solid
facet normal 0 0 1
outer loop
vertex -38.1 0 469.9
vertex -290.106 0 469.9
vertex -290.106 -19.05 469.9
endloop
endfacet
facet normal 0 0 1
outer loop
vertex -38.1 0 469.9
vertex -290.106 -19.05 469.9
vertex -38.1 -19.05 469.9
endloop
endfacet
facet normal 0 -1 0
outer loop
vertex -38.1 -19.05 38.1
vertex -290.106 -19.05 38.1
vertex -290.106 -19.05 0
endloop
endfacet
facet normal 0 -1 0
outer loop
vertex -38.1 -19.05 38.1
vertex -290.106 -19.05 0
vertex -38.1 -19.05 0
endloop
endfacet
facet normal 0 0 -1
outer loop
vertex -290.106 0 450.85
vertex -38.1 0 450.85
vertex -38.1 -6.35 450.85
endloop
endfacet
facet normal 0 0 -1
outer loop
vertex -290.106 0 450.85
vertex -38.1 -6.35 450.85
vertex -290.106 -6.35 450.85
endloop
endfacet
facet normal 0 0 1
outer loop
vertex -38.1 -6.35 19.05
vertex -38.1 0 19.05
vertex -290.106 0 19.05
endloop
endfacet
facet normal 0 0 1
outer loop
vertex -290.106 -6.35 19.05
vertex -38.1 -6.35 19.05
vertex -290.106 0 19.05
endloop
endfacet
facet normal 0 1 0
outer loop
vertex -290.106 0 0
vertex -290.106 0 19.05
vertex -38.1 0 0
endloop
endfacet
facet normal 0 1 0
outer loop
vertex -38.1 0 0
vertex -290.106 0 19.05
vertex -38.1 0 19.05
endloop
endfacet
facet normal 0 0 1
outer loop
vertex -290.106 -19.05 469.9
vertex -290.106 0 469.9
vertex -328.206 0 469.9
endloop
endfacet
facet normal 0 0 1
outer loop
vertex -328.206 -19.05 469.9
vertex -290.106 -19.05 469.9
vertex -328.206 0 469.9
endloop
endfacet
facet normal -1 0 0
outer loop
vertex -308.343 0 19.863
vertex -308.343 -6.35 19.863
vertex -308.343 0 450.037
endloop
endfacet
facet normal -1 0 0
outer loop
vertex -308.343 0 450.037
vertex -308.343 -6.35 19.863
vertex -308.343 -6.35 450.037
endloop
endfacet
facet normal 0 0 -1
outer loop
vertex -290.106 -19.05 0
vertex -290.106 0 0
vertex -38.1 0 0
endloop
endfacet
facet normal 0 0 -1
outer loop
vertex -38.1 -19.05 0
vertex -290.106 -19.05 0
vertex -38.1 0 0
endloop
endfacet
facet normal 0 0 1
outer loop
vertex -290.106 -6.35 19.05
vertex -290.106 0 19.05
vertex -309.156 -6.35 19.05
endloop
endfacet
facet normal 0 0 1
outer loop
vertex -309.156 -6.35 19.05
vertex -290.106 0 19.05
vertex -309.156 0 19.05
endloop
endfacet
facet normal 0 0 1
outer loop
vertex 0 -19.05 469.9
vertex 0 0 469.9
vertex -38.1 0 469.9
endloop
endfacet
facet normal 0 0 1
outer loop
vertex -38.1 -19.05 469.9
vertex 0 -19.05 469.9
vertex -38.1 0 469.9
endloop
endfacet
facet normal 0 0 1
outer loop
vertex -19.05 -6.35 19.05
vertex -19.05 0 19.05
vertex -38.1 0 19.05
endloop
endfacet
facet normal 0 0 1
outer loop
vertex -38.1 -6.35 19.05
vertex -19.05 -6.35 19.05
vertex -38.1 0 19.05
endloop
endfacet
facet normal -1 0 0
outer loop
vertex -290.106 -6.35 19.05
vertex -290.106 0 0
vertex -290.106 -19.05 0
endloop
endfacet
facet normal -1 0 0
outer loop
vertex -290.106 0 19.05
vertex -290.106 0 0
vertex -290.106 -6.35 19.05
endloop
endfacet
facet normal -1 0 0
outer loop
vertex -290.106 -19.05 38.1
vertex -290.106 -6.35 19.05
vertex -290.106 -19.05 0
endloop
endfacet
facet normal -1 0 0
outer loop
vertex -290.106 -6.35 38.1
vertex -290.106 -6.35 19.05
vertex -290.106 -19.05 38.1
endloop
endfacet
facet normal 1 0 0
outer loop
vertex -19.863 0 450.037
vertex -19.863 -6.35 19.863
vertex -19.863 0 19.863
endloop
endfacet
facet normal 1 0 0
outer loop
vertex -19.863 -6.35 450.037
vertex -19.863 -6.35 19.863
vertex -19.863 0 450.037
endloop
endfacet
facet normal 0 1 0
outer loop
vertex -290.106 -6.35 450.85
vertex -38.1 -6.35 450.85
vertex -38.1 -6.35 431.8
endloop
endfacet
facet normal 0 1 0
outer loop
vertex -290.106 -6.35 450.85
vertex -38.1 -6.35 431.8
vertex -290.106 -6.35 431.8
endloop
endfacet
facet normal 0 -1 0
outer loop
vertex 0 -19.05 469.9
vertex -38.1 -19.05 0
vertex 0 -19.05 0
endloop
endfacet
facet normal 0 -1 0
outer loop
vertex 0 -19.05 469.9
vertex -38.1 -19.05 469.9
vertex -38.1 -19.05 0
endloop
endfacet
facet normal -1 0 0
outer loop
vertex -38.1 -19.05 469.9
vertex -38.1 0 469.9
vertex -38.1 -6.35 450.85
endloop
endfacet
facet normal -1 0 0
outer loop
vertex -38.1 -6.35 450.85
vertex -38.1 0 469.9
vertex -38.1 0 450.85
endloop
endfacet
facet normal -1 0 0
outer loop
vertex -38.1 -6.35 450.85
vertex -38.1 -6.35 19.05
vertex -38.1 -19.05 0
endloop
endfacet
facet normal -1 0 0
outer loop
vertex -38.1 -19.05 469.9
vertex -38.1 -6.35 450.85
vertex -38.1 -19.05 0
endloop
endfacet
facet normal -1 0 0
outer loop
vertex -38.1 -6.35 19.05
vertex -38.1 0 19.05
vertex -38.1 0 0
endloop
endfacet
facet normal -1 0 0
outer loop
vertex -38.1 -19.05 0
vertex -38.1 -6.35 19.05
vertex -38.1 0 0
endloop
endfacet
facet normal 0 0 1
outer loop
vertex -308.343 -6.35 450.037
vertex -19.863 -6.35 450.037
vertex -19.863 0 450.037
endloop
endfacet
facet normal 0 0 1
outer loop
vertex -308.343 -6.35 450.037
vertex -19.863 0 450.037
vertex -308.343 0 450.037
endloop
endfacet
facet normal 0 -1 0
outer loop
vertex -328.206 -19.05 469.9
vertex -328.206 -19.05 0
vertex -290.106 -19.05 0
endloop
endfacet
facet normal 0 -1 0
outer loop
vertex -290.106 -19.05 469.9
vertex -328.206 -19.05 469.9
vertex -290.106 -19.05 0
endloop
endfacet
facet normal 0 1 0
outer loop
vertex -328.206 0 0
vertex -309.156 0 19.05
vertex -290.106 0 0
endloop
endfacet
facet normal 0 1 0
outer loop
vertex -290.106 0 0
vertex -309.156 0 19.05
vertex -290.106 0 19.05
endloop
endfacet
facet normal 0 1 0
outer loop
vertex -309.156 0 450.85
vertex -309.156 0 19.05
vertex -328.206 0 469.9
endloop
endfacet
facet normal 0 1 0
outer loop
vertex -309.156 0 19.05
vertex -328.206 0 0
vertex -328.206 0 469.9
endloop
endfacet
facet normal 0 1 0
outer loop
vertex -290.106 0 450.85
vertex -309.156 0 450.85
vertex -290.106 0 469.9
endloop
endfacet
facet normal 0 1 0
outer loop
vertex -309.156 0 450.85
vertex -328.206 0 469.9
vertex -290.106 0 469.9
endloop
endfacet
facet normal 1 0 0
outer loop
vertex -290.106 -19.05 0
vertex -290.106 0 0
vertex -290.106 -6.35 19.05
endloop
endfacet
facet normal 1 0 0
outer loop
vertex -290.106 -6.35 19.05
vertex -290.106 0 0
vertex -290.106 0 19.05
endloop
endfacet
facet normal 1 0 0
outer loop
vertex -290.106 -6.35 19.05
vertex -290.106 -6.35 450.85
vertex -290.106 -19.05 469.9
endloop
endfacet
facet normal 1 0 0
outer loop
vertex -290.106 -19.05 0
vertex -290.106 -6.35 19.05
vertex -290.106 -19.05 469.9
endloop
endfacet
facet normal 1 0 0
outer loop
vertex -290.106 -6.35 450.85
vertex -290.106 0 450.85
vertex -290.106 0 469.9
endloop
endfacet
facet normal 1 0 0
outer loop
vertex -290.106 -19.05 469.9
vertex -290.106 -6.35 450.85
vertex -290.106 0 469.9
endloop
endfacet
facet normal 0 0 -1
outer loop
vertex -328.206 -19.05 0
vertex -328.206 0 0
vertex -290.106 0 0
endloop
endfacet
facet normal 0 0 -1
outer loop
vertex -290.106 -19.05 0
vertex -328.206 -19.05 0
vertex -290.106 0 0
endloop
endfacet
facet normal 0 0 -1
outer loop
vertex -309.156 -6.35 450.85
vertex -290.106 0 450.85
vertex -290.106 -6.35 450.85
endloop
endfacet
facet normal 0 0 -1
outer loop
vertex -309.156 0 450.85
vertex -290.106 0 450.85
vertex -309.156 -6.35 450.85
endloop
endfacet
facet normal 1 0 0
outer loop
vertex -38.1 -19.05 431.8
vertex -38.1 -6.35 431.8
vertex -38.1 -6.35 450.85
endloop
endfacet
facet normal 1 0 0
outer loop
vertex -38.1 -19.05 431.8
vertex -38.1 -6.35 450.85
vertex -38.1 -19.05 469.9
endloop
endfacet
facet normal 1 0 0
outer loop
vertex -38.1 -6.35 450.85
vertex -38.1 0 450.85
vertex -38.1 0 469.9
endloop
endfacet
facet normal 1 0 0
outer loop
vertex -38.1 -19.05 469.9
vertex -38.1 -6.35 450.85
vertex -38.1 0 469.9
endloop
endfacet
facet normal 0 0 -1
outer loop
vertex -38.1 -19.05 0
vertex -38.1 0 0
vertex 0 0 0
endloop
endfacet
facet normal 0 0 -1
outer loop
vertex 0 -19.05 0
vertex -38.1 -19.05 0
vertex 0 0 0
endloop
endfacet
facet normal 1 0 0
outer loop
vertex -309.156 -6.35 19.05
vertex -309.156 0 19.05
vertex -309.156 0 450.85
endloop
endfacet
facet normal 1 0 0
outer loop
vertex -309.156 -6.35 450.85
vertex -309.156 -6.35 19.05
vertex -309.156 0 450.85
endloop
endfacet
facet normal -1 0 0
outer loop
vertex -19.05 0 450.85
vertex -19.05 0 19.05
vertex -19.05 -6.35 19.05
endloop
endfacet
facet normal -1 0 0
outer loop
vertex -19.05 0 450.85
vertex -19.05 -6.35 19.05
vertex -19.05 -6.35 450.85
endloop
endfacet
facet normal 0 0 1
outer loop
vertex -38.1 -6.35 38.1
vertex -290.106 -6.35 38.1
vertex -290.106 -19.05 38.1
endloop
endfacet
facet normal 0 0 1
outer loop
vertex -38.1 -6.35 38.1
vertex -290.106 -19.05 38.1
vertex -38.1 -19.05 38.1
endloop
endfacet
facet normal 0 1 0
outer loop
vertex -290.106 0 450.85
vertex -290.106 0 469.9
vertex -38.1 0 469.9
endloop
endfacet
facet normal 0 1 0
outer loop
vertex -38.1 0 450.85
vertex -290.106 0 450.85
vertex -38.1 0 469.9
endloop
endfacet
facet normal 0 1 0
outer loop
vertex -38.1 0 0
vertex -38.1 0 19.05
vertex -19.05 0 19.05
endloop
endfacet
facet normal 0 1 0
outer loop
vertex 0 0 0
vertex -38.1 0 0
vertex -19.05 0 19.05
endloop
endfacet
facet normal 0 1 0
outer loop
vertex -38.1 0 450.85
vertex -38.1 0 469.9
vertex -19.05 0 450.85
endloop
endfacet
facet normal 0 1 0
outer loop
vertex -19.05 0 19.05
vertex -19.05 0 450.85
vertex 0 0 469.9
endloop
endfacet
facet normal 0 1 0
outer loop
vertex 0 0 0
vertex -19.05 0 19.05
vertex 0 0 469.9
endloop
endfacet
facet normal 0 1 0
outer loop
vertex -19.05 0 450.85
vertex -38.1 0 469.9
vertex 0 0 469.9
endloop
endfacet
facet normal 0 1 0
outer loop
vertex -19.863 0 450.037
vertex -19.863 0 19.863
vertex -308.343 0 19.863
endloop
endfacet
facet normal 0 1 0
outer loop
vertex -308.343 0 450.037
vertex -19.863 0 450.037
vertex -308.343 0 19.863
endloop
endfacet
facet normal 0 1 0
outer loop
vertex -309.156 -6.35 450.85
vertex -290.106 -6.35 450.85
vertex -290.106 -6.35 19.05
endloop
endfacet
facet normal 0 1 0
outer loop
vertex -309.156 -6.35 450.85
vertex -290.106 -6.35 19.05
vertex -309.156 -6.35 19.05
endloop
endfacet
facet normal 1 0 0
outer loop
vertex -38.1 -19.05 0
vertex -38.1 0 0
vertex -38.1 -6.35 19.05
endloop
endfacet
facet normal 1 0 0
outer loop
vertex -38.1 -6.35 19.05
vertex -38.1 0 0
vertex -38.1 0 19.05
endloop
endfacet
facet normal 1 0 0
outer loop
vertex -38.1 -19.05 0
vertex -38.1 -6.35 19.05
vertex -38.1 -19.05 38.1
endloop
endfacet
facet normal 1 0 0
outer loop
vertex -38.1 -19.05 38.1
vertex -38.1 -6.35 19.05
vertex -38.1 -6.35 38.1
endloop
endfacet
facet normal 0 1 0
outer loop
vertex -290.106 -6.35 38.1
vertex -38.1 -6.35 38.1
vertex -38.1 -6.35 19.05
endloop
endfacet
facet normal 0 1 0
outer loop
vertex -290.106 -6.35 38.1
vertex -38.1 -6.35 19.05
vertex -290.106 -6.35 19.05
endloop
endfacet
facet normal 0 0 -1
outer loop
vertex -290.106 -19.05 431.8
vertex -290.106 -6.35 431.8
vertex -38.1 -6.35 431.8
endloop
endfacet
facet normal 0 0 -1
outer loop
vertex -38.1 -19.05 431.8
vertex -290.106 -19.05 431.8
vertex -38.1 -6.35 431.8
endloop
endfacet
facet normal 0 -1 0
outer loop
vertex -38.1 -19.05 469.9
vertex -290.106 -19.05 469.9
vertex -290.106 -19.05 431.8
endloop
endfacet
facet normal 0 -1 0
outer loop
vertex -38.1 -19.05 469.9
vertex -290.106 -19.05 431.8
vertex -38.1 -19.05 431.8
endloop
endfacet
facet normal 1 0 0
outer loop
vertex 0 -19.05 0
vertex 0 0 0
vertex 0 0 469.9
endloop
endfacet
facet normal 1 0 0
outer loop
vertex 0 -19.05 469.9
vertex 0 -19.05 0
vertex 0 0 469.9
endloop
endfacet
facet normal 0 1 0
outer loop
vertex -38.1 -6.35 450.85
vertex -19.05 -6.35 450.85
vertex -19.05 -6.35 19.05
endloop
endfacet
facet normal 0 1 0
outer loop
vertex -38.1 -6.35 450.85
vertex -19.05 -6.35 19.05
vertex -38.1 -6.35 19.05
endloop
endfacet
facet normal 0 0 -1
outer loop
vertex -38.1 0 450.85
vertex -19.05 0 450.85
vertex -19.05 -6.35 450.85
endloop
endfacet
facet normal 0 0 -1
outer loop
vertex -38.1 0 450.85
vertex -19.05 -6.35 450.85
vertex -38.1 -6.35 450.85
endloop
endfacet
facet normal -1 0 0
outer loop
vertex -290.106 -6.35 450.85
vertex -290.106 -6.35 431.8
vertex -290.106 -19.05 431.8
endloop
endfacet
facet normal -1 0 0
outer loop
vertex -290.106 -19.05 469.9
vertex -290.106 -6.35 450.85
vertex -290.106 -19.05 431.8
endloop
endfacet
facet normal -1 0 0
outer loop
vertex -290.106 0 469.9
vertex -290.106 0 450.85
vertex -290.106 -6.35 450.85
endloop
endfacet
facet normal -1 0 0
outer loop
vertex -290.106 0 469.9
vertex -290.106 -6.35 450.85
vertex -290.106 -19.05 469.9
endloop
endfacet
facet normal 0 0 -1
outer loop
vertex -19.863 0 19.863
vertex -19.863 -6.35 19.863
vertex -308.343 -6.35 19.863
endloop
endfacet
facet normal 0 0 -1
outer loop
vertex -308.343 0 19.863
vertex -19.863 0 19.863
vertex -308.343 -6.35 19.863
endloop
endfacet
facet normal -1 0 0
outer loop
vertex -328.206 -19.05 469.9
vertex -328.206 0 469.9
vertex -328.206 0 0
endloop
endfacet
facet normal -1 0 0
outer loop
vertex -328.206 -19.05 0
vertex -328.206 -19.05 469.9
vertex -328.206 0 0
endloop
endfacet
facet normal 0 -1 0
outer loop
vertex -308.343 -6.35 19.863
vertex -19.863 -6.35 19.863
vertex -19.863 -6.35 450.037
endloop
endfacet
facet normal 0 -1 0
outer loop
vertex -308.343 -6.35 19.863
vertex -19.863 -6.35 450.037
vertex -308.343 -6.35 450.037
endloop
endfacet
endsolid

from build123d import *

# Parameters (mm, degrees)
F0_W     = 252.0061
F0_H     = 38.1
F1_DEPTH = 19.05
F2_DEPTH = 19.05
F3_DEPTH = 19.05
F4_DEPTH = 19.05
F5_W     = 290.1061
F5_H     = 431.8
F6_DEPTH = 6.35
F7_W     = 288.4805
F7_H     = 430.1744
F8_DEPTH = 6.35


with BuildPart() as f1:
    # F0 (on Front) → F1 (new body)
    with BuildSketch(Plane.XZ):
        with Locations((-164.10305, 450.85)):
            Rectangle(F0_W, F0_H)
    extrude(amount=F1_DEPTH)


with BuildPart() as f2:
    # F0 (on Front) → F2 (new body)
    with BuildSketch(Plane.XZ):
        Polygon((-328.2061, 0), (-290.1061, 0), (-290.1061, 38.1), (-290.1061, 431.8), (-290.1061, 469.9), (-328.2061, 469.9), align=None)
    extrude(amount=F2_DEPTH)


with BuildPart() as f3:
    # F0 (on Front) → F3 (new body)
    with BuildSketch(Plane.XZ):
        with Locations((-164.10305, 19.05)):
            Rectangle(F0_W, F0_H)
    extrude(amount=F3_DEPTH)


with BuildPart() as f4:
    # F0 (on Front) → F4 (new body)
    with BuildSketch(Plane.XZ):
        Polygon((-38.1, 0), (0, 0), (0, 469.9), (-38.1, 469.9), (-38.1, 431.8), (-38.1, 38.1), align=None)
    extrude(amount=F4_DEPTH)


with BuildPart() as f6_tool:
    # F5 (on face) → F6 (new body)
    with BuildSketch(Plane(origin=(0, 0, 0), x_dir=(-1, 0, 0), z_dir=(0, 1, 0))):
        with Locations((164.10305, 234.95)):
            Rectangle(F5_W, F5_H)
    extrude(amount=-F6_DEPTH)


with BuildPart() as f1_1:
    add(f1.part)

    # F6: cut by f6_tool
    add(f6_tool.part, mode=Mode.SUBTRACT)


with BuildPart() as f2_1:
    add(f2.part)

    # F6: cut by f6_tool
    add(f6_tool.part, mode=Mode.SUBTRACT)


with BuildPart() as f3_1:
    add(f3.part)

    # F6: cut by f6_tool
    add(f6_tool.part, mode=Mode.SUBTRACT)


with BuildPart() as f4_1:
    add(f4.part)

    # F6: cut by f6_tool
    add(f6_tool.part, mode=Mode.SUBTRACT)


with BuildPart() as f8:
    # F7 (on face) → F8 (new body, through all)
    with BuildSketch(Plane(origin=(0, -6.35, 0), x_dir=(-1, 0, 0), z_dir=(0, 1, 0))):
        with Locations((164.10305, 234.95)):
            Rectangle(F7_W, F7_H)
    extrude(amount=F8_DEPTH)


solid = Compound([f1_1.part, f2_1.part, f3_1.part, f4_1.part, f8.part])
